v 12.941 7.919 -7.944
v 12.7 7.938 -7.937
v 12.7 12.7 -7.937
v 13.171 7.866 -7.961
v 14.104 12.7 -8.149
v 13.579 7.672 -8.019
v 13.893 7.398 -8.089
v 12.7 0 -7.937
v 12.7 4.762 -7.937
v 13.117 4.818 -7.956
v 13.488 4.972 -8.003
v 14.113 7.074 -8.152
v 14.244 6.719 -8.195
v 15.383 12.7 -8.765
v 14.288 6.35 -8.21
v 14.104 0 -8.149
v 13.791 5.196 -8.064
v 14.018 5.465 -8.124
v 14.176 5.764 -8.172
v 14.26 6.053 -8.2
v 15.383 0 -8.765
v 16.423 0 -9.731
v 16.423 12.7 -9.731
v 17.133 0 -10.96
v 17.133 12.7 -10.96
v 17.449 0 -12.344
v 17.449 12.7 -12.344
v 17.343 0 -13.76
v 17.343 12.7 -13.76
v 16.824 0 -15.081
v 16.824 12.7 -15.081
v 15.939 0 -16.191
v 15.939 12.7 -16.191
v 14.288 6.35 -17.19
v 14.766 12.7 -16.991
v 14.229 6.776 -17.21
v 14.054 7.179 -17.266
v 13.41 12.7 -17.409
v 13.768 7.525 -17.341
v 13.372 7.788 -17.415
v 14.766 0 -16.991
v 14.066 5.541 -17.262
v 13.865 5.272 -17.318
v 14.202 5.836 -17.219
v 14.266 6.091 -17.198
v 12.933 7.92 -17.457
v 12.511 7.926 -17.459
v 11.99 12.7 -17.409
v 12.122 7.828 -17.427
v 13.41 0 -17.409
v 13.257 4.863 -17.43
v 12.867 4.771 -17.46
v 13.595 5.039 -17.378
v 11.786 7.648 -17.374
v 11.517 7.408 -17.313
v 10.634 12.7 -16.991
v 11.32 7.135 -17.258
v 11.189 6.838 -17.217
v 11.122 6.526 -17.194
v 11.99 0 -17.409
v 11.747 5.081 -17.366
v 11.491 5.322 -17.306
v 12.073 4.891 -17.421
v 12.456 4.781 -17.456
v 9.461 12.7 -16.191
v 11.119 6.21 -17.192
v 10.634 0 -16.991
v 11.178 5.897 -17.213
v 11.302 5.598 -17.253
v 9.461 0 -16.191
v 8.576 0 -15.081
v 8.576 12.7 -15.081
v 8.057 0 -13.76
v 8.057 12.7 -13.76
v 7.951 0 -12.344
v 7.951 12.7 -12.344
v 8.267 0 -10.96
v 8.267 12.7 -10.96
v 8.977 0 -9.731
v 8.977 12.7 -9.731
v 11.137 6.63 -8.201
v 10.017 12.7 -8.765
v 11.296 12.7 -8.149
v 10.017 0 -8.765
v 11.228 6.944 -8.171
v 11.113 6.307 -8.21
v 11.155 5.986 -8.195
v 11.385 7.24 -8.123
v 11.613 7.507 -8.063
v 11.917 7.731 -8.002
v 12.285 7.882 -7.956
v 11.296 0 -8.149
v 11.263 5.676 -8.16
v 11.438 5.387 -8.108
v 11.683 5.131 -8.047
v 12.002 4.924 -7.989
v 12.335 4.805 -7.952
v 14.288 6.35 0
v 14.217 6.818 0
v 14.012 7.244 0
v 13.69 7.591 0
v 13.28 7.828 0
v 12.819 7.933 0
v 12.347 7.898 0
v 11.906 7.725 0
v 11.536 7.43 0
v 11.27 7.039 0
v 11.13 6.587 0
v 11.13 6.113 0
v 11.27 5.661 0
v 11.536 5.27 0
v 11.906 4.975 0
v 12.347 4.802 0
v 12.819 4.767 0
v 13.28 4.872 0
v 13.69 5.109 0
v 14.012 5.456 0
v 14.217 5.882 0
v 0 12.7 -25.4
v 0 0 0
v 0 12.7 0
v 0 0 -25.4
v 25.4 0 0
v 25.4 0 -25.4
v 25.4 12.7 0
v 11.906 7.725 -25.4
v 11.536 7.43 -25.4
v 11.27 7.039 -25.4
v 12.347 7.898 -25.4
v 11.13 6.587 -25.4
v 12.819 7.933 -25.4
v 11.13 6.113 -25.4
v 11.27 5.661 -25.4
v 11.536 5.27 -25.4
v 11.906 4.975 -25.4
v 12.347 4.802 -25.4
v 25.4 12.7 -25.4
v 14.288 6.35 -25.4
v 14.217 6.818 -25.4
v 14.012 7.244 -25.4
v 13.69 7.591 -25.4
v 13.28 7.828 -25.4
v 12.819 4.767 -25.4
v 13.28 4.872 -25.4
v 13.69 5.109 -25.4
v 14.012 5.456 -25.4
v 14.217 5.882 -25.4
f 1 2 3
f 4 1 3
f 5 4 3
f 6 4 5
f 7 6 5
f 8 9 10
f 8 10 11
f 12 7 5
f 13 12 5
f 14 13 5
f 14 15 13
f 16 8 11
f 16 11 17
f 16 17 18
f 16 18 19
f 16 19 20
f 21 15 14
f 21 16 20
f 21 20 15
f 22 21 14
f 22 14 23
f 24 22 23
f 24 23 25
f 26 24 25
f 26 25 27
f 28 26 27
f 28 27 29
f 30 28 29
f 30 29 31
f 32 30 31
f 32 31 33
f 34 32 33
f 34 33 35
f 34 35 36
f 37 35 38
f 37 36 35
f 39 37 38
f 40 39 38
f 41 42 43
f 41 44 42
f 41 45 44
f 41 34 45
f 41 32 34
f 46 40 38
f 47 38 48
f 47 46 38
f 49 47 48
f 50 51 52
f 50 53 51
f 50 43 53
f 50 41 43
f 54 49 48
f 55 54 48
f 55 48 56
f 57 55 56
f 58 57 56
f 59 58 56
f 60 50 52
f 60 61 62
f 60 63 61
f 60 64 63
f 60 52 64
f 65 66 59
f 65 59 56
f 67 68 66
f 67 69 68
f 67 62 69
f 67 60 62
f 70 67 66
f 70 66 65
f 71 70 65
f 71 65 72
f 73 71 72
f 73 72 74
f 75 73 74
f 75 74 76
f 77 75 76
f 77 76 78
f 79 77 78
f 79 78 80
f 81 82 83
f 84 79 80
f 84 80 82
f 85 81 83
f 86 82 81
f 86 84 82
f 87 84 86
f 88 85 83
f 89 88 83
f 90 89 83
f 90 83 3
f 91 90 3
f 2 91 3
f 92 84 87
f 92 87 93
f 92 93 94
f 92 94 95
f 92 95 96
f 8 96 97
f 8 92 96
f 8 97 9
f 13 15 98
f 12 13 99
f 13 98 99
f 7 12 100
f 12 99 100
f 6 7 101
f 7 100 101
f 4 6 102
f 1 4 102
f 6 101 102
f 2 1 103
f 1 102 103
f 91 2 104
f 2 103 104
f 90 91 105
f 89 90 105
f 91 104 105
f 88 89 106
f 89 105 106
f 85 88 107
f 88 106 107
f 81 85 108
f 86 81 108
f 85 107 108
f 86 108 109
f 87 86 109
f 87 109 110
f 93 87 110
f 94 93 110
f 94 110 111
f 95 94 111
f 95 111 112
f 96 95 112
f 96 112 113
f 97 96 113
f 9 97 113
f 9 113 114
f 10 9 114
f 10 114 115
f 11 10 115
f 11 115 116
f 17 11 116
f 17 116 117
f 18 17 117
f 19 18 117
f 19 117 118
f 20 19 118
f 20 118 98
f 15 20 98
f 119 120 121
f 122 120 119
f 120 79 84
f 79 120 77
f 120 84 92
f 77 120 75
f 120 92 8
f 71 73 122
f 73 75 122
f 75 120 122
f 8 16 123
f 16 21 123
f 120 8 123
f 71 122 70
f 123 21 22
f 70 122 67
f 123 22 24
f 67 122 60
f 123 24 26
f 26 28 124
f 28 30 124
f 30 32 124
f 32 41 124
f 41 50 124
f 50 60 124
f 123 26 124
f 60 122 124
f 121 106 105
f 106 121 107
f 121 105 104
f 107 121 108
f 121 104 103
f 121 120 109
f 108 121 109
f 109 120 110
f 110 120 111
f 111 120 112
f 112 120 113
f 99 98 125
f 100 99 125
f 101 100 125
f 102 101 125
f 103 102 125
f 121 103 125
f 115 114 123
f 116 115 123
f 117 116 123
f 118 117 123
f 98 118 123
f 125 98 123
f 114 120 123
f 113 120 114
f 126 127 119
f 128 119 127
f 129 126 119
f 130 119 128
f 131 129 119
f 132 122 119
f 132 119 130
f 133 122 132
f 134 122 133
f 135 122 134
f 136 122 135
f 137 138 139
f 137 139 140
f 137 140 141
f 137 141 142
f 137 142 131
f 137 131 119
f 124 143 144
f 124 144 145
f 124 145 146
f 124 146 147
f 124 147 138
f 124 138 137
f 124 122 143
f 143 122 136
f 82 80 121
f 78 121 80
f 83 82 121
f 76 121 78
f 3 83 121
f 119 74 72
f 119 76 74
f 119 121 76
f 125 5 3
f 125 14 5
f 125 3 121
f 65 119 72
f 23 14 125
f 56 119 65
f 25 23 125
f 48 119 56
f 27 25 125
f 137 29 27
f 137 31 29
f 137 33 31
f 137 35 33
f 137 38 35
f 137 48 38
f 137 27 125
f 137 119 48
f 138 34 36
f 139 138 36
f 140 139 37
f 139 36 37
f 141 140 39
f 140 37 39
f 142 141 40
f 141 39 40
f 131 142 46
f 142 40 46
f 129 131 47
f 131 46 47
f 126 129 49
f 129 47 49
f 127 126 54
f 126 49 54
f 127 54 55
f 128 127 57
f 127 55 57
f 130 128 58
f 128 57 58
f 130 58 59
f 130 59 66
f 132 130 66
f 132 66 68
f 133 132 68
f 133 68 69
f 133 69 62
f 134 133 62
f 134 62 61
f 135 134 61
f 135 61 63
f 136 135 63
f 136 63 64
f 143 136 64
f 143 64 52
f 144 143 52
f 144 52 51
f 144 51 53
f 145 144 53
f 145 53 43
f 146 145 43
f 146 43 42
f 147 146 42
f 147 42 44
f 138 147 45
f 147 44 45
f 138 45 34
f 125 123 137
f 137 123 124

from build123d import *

# Parameters (mm, degrees)
SKETCH1_W           = 25.4
SKETCH1_H           = 25.4
SKETCH1_R           = 4.7625
BOSS_EXTRUDE1_DEPTH = 12.7
SKETCH2_R           = 1.5875
CUT_EXTRUDE1_DEPTH  = 39.1


with BuildPart() as part:
    # Sketch1 → Boss-Extrude1 (new body)
    with BuildSketch(Plane(origin=(0, 0, 0), x_dir=(1, 0, 0), z_dir=(0, 1, 0))):
        with Locations((12.7, 12.7)):
            Rectangle(SKETCH1_W, SKETCH1_H)
        with Locations(Location((12.7, 12.7, 0), (0, 0, 270))):
            Circle(SKETCH1_R, mode=Mode.SUBTRACT)
    extrude(amount=BOSS_EXTRUDE1_DEPTH)

    # Sketch2 → Cut-Extrude1 (cut, through all)
    with BuildSketch(Plane.XY):
        with Locations((12.7, 6.35)):
            Circle(SKETCH2_R)
    extrude(amount=-CUT_EXTRUDE1_DEPTH, mode=Mode.SUBTRACT)


solid = part.part
